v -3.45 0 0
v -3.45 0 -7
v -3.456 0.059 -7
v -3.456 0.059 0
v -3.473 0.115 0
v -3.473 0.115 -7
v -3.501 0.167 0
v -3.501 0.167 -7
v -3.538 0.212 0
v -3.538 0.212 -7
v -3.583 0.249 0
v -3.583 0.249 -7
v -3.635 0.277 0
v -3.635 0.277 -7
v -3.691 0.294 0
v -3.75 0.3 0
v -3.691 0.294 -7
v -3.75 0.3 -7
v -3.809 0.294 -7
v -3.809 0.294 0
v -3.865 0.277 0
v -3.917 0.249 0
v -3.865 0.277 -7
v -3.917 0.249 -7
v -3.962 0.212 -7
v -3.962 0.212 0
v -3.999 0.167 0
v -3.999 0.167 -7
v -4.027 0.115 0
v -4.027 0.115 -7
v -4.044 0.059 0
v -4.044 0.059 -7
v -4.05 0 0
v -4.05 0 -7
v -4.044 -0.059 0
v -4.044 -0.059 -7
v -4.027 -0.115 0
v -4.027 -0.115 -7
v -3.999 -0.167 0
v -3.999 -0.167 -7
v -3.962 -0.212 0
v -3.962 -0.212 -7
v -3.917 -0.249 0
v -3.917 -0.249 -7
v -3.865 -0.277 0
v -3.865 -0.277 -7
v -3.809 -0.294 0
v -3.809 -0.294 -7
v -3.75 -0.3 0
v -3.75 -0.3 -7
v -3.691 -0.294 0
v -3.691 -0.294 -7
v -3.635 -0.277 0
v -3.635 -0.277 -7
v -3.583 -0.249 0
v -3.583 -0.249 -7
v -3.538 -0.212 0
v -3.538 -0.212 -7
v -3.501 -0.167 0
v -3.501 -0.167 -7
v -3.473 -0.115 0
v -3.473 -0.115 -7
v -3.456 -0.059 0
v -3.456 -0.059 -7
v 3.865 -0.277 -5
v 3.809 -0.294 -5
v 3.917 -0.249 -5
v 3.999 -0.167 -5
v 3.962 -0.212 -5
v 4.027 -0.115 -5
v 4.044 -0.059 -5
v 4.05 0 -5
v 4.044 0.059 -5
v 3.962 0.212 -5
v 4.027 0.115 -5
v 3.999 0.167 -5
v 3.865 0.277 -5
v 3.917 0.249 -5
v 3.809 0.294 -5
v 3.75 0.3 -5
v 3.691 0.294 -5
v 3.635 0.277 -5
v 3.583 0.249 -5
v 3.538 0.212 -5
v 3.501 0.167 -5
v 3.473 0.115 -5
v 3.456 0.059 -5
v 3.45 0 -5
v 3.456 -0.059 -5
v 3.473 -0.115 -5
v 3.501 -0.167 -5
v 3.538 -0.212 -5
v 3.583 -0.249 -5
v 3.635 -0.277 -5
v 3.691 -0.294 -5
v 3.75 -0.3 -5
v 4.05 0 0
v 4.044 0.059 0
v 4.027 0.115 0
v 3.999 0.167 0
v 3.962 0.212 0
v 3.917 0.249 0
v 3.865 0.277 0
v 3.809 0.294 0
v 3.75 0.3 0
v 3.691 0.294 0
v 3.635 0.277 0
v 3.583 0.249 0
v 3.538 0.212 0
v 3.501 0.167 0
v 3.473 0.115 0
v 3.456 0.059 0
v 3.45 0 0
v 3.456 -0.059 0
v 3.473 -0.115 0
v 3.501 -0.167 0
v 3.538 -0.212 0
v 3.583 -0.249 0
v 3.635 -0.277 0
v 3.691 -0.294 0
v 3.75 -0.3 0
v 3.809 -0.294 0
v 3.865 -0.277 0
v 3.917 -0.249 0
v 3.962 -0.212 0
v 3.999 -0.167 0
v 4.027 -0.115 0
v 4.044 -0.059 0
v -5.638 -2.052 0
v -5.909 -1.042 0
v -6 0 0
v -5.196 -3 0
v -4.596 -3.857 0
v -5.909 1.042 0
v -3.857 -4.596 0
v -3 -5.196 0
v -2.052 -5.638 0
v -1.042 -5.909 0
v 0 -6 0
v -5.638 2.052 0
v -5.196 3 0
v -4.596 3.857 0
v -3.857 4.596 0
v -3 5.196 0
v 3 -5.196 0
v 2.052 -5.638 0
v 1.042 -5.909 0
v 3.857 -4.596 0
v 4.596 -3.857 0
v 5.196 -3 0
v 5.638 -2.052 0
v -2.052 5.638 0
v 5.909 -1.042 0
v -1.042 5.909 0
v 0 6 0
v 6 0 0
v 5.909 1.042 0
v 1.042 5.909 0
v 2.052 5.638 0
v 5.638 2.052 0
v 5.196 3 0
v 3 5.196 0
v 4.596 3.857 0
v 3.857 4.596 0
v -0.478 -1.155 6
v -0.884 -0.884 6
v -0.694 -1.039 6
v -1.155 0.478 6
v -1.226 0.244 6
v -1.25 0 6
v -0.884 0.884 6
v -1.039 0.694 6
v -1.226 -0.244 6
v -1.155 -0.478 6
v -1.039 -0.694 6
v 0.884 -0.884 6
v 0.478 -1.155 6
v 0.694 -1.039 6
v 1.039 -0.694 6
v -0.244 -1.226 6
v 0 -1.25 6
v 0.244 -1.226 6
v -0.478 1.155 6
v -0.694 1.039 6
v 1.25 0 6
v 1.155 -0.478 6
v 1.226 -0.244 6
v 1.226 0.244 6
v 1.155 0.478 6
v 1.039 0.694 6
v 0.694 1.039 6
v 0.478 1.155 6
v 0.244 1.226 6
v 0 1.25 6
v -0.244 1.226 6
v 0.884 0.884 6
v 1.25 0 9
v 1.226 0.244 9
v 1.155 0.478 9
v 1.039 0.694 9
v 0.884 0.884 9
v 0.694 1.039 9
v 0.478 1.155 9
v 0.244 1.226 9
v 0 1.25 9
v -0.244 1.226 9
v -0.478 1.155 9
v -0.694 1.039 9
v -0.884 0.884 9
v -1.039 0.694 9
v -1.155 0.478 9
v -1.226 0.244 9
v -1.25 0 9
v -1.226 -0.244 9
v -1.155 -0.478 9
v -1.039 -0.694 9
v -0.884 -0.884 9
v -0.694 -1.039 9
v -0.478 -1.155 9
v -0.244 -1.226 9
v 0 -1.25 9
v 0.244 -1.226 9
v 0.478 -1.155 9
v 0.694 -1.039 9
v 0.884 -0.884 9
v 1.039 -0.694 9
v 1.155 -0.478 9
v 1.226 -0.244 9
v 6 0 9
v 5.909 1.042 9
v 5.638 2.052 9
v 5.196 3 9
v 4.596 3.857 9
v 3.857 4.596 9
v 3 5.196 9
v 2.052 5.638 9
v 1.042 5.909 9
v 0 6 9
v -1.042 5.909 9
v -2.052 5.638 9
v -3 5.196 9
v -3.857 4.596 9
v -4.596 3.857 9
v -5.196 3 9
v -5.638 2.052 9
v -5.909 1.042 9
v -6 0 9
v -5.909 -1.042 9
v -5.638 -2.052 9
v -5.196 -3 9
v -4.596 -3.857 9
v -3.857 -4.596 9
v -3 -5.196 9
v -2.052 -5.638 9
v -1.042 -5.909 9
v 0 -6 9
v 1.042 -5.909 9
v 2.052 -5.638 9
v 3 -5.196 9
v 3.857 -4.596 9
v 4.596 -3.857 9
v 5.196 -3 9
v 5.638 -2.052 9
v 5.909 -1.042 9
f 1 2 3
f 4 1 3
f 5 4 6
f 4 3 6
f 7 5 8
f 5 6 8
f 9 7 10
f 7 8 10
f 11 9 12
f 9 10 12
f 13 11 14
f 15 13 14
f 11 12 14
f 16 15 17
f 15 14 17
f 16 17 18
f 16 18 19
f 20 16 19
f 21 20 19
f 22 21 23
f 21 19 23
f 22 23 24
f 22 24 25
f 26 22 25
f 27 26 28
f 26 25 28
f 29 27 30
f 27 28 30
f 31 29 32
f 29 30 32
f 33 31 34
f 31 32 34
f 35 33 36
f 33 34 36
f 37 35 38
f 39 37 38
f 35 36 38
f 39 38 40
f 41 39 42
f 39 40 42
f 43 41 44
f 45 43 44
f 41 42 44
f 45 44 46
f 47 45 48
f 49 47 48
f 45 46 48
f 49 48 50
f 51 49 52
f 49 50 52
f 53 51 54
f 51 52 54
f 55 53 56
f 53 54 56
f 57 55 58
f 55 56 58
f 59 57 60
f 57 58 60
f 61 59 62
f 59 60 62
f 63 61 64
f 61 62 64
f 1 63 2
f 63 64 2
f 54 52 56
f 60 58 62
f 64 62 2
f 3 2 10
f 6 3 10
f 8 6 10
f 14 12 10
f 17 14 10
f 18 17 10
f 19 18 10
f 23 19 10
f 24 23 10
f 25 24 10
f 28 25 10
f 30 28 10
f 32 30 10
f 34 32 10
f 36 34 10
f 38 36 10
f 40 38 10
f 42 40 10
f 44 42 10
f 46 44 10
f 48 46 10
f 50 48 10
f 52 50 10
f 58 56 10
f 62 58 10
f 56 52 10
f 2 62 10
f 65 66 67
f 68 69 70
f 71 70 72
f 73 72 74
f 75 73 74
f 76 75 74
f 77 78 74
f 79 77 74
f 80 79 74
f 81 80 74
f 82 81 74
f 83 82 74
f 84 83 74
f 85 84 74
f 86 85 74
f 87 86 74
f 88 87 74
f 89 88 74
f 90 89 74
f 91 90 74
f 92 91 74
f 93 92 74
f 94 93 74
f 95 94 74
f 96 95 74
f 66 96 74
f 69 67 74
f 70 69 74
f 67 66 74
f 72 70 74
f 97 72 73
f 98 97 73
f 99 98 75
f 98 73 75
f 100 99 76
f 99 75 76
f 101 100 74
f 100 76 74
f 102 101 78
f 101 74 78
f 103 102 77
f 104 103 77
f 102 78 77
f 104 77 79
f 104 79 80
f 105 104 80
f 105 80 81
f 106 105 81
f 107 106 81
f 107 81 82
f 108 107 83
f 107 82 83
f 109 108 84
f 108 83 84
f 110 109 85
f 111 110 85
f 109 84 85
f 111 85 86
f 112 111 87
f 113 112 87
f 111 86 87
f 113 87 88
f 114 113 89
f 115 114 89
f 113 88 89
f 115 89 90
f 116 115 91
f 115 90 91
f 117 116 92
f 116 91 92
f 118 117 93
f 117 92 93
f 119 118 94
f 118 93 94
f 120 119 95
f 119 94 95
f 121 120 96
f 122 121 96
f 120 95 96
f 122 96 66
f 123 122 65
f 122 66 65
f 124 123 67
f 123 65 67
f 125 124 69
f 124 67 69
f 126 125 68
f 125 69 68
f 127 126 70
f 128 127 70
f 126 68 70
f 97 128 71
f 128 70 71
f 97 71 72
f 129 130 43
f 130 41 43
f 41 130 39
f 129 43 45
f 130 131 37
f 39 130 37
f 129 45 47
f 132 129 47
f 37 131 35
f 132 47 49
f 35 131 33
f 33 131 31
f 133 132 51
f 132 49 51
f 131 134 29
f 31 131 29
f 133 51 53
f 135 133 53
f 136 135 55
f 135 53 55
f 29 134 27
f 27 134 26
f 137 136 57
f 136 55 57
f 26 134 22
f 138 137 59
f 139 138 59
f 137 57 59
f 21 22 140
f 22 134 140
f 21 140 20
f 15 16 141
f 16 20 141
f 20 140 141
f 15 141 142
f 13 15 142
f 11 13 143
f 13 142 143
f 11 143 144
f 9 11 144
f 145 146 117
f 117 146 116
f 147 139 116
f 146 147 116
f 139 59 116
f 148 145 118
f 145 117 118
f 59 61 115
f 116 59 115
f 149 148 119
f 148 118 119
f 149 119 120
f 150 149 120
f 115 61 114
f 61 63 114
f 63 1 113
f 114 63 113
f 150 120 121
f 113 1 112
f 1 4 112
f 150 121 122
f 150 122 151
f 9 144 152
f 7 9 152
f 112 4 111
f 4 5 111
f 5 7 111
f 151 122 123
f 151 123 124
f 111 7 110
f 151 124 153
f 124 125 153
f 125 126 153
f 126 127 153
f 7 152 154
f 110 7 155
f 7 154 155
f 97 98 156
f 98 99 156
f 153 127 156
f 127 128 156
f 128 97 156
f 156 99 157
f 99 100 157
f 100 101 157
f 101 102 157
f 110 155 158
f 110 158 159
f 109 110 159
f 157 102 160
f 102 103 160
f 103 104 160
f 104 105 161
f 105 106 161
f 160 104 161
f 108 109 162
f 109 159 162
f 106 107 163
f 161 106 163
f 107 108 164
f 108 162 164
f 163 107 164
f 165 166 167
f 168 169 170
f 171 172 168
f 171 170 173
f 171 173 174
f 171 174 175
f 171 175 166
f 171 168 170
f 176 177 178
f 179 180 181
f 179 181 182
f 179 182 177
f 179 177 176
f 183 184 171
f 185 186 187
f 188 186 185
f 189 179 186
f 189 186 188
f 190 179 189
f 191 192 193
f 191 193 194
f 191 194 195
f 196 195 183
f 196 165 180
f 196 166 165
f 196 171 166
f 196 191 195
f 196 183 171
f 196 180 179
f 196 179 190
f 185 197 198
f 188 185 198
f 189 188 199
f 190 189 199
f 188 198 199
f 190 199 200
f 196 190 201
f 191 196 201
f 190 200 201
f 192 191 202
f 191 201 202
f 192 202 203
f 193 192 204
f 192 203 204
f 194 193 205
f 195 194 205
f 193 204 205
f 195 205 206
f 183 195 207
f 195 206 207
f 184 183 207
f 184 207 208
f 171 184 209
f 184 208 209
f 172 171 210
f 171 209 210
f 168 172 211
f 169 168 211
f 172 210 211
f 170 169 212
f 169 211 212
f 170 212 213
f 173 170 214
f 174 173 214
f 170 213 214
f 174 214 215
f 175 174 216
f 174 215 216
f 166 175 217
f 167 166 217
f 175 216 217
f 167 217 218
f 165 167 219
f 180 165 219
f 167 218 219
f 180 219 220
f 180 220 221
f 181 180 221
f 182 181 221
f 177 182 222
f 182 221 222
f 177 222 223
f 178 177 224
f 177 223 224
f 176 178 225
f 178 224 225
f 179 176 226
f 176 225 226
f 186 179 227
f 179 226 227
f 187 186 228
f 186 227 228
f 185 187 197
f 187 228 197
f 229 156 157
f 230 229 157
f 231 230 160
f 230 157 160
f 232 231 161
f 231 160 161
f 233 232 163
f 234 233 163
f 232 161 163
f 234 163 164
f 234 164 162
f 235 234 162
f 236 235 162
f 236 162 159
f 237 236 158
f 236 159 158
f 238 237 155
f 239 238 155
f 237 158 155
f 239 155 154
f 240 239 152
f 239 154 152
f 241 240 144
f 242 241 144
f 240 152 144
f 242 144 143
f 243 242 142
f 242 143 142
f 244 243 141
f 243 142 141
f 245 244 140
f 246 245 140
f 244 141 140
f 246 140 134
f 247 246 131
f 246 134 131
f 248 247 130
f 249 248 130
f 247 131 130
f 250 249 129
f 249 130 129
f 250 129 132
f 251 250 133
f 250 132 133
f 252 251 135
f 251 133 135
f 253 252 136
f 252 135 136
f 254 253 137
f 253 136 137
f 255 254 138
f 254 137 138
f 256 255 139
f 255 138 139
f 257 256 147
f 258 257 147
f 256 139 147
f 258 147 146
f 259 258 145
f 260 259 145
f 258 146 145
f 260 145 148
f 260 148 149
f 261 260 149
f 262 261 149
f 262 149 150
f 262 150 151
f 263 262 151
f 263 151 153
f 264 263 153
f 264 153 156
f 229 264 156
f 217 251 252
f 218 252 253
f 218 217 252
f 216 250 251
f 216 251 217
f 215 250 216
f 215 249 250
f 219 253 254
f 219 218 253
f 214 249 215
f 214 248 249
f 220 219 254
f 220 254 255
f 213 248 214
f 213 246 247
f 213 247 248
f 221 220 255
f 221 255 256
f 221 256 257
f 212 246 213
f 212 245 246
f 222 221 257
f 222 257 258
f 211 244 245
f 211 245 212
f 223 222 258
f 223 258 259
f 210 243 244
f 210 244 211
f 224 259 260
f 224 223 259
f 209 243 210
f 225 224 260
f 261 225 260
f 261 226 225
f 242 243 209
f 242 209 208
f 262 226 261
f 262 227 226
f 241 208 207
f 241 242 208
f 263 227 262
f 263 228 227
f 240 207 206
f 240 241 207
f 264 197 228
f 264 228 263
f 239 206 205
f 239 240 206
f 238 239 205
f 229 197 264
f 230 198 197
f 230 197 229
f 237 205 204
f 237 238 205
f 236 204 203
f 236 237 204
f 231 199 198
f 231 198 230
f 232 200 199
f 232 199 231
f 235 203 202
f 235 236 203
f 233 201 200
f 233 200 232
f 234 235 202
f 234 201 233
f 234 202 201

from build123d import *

# Parameters (mm, degrees)
CYLINDER_R        = 6
CYLINDER_DEPTH    = 9
SKETCH_R          = 1.25
POCKET_DEPTH      = 3
CYLINDER002_R     = 0.3
CYLINDER002_DEPTH = 5
CYLINDER001_R     = 0.3
CYLINDER001_DEPTH = 7


with BuildPart() as hole_pocket:
    # Cylinder → Cylinder (new body)
    with BuildSketch(Plane.XY):
        Circle(CYLINDER_R)
    extrude(amount=CYLINDER_DEPTH)

    # Sketch → Pocket (cut)
    with BuildSketch(Plane.XY.offset(9)):
        Circle(SKETCH_R)
    extrude(amount=-POCKET_DEPTH, mode=Mode.SUBTRACT)


with BuildPart() as cathode_cylinder:
    # Cylinder002 → Cylinder002 (new body)
    with BuildSketch(Plane(origin=(3.75, 0, -5), x_dir=(1, 0, 0), z_dir=(0, 0, 1))):
        Circle(CYLINDER002_R)
    extrude(amount=CYLINDER002_DEPTH)


with BuildPart() as buzzer:
    # Cylinder001 → Cylinder001 (new body)
    with BuildSketch(Plane(origin=(-3.75, 0, -7), x_dir=(1, 0, 0), z_dir=(0, 0, 1))):
        Circle(CYLINDER001_R)
    extrude(amount=CYLINDER001_DEPTH)

    # Fusion: union hole-pocket, cathode-cylinder
    add(hole_pocket.part)
    add(cathode_cylinder.part)


solid = buzzer.part
